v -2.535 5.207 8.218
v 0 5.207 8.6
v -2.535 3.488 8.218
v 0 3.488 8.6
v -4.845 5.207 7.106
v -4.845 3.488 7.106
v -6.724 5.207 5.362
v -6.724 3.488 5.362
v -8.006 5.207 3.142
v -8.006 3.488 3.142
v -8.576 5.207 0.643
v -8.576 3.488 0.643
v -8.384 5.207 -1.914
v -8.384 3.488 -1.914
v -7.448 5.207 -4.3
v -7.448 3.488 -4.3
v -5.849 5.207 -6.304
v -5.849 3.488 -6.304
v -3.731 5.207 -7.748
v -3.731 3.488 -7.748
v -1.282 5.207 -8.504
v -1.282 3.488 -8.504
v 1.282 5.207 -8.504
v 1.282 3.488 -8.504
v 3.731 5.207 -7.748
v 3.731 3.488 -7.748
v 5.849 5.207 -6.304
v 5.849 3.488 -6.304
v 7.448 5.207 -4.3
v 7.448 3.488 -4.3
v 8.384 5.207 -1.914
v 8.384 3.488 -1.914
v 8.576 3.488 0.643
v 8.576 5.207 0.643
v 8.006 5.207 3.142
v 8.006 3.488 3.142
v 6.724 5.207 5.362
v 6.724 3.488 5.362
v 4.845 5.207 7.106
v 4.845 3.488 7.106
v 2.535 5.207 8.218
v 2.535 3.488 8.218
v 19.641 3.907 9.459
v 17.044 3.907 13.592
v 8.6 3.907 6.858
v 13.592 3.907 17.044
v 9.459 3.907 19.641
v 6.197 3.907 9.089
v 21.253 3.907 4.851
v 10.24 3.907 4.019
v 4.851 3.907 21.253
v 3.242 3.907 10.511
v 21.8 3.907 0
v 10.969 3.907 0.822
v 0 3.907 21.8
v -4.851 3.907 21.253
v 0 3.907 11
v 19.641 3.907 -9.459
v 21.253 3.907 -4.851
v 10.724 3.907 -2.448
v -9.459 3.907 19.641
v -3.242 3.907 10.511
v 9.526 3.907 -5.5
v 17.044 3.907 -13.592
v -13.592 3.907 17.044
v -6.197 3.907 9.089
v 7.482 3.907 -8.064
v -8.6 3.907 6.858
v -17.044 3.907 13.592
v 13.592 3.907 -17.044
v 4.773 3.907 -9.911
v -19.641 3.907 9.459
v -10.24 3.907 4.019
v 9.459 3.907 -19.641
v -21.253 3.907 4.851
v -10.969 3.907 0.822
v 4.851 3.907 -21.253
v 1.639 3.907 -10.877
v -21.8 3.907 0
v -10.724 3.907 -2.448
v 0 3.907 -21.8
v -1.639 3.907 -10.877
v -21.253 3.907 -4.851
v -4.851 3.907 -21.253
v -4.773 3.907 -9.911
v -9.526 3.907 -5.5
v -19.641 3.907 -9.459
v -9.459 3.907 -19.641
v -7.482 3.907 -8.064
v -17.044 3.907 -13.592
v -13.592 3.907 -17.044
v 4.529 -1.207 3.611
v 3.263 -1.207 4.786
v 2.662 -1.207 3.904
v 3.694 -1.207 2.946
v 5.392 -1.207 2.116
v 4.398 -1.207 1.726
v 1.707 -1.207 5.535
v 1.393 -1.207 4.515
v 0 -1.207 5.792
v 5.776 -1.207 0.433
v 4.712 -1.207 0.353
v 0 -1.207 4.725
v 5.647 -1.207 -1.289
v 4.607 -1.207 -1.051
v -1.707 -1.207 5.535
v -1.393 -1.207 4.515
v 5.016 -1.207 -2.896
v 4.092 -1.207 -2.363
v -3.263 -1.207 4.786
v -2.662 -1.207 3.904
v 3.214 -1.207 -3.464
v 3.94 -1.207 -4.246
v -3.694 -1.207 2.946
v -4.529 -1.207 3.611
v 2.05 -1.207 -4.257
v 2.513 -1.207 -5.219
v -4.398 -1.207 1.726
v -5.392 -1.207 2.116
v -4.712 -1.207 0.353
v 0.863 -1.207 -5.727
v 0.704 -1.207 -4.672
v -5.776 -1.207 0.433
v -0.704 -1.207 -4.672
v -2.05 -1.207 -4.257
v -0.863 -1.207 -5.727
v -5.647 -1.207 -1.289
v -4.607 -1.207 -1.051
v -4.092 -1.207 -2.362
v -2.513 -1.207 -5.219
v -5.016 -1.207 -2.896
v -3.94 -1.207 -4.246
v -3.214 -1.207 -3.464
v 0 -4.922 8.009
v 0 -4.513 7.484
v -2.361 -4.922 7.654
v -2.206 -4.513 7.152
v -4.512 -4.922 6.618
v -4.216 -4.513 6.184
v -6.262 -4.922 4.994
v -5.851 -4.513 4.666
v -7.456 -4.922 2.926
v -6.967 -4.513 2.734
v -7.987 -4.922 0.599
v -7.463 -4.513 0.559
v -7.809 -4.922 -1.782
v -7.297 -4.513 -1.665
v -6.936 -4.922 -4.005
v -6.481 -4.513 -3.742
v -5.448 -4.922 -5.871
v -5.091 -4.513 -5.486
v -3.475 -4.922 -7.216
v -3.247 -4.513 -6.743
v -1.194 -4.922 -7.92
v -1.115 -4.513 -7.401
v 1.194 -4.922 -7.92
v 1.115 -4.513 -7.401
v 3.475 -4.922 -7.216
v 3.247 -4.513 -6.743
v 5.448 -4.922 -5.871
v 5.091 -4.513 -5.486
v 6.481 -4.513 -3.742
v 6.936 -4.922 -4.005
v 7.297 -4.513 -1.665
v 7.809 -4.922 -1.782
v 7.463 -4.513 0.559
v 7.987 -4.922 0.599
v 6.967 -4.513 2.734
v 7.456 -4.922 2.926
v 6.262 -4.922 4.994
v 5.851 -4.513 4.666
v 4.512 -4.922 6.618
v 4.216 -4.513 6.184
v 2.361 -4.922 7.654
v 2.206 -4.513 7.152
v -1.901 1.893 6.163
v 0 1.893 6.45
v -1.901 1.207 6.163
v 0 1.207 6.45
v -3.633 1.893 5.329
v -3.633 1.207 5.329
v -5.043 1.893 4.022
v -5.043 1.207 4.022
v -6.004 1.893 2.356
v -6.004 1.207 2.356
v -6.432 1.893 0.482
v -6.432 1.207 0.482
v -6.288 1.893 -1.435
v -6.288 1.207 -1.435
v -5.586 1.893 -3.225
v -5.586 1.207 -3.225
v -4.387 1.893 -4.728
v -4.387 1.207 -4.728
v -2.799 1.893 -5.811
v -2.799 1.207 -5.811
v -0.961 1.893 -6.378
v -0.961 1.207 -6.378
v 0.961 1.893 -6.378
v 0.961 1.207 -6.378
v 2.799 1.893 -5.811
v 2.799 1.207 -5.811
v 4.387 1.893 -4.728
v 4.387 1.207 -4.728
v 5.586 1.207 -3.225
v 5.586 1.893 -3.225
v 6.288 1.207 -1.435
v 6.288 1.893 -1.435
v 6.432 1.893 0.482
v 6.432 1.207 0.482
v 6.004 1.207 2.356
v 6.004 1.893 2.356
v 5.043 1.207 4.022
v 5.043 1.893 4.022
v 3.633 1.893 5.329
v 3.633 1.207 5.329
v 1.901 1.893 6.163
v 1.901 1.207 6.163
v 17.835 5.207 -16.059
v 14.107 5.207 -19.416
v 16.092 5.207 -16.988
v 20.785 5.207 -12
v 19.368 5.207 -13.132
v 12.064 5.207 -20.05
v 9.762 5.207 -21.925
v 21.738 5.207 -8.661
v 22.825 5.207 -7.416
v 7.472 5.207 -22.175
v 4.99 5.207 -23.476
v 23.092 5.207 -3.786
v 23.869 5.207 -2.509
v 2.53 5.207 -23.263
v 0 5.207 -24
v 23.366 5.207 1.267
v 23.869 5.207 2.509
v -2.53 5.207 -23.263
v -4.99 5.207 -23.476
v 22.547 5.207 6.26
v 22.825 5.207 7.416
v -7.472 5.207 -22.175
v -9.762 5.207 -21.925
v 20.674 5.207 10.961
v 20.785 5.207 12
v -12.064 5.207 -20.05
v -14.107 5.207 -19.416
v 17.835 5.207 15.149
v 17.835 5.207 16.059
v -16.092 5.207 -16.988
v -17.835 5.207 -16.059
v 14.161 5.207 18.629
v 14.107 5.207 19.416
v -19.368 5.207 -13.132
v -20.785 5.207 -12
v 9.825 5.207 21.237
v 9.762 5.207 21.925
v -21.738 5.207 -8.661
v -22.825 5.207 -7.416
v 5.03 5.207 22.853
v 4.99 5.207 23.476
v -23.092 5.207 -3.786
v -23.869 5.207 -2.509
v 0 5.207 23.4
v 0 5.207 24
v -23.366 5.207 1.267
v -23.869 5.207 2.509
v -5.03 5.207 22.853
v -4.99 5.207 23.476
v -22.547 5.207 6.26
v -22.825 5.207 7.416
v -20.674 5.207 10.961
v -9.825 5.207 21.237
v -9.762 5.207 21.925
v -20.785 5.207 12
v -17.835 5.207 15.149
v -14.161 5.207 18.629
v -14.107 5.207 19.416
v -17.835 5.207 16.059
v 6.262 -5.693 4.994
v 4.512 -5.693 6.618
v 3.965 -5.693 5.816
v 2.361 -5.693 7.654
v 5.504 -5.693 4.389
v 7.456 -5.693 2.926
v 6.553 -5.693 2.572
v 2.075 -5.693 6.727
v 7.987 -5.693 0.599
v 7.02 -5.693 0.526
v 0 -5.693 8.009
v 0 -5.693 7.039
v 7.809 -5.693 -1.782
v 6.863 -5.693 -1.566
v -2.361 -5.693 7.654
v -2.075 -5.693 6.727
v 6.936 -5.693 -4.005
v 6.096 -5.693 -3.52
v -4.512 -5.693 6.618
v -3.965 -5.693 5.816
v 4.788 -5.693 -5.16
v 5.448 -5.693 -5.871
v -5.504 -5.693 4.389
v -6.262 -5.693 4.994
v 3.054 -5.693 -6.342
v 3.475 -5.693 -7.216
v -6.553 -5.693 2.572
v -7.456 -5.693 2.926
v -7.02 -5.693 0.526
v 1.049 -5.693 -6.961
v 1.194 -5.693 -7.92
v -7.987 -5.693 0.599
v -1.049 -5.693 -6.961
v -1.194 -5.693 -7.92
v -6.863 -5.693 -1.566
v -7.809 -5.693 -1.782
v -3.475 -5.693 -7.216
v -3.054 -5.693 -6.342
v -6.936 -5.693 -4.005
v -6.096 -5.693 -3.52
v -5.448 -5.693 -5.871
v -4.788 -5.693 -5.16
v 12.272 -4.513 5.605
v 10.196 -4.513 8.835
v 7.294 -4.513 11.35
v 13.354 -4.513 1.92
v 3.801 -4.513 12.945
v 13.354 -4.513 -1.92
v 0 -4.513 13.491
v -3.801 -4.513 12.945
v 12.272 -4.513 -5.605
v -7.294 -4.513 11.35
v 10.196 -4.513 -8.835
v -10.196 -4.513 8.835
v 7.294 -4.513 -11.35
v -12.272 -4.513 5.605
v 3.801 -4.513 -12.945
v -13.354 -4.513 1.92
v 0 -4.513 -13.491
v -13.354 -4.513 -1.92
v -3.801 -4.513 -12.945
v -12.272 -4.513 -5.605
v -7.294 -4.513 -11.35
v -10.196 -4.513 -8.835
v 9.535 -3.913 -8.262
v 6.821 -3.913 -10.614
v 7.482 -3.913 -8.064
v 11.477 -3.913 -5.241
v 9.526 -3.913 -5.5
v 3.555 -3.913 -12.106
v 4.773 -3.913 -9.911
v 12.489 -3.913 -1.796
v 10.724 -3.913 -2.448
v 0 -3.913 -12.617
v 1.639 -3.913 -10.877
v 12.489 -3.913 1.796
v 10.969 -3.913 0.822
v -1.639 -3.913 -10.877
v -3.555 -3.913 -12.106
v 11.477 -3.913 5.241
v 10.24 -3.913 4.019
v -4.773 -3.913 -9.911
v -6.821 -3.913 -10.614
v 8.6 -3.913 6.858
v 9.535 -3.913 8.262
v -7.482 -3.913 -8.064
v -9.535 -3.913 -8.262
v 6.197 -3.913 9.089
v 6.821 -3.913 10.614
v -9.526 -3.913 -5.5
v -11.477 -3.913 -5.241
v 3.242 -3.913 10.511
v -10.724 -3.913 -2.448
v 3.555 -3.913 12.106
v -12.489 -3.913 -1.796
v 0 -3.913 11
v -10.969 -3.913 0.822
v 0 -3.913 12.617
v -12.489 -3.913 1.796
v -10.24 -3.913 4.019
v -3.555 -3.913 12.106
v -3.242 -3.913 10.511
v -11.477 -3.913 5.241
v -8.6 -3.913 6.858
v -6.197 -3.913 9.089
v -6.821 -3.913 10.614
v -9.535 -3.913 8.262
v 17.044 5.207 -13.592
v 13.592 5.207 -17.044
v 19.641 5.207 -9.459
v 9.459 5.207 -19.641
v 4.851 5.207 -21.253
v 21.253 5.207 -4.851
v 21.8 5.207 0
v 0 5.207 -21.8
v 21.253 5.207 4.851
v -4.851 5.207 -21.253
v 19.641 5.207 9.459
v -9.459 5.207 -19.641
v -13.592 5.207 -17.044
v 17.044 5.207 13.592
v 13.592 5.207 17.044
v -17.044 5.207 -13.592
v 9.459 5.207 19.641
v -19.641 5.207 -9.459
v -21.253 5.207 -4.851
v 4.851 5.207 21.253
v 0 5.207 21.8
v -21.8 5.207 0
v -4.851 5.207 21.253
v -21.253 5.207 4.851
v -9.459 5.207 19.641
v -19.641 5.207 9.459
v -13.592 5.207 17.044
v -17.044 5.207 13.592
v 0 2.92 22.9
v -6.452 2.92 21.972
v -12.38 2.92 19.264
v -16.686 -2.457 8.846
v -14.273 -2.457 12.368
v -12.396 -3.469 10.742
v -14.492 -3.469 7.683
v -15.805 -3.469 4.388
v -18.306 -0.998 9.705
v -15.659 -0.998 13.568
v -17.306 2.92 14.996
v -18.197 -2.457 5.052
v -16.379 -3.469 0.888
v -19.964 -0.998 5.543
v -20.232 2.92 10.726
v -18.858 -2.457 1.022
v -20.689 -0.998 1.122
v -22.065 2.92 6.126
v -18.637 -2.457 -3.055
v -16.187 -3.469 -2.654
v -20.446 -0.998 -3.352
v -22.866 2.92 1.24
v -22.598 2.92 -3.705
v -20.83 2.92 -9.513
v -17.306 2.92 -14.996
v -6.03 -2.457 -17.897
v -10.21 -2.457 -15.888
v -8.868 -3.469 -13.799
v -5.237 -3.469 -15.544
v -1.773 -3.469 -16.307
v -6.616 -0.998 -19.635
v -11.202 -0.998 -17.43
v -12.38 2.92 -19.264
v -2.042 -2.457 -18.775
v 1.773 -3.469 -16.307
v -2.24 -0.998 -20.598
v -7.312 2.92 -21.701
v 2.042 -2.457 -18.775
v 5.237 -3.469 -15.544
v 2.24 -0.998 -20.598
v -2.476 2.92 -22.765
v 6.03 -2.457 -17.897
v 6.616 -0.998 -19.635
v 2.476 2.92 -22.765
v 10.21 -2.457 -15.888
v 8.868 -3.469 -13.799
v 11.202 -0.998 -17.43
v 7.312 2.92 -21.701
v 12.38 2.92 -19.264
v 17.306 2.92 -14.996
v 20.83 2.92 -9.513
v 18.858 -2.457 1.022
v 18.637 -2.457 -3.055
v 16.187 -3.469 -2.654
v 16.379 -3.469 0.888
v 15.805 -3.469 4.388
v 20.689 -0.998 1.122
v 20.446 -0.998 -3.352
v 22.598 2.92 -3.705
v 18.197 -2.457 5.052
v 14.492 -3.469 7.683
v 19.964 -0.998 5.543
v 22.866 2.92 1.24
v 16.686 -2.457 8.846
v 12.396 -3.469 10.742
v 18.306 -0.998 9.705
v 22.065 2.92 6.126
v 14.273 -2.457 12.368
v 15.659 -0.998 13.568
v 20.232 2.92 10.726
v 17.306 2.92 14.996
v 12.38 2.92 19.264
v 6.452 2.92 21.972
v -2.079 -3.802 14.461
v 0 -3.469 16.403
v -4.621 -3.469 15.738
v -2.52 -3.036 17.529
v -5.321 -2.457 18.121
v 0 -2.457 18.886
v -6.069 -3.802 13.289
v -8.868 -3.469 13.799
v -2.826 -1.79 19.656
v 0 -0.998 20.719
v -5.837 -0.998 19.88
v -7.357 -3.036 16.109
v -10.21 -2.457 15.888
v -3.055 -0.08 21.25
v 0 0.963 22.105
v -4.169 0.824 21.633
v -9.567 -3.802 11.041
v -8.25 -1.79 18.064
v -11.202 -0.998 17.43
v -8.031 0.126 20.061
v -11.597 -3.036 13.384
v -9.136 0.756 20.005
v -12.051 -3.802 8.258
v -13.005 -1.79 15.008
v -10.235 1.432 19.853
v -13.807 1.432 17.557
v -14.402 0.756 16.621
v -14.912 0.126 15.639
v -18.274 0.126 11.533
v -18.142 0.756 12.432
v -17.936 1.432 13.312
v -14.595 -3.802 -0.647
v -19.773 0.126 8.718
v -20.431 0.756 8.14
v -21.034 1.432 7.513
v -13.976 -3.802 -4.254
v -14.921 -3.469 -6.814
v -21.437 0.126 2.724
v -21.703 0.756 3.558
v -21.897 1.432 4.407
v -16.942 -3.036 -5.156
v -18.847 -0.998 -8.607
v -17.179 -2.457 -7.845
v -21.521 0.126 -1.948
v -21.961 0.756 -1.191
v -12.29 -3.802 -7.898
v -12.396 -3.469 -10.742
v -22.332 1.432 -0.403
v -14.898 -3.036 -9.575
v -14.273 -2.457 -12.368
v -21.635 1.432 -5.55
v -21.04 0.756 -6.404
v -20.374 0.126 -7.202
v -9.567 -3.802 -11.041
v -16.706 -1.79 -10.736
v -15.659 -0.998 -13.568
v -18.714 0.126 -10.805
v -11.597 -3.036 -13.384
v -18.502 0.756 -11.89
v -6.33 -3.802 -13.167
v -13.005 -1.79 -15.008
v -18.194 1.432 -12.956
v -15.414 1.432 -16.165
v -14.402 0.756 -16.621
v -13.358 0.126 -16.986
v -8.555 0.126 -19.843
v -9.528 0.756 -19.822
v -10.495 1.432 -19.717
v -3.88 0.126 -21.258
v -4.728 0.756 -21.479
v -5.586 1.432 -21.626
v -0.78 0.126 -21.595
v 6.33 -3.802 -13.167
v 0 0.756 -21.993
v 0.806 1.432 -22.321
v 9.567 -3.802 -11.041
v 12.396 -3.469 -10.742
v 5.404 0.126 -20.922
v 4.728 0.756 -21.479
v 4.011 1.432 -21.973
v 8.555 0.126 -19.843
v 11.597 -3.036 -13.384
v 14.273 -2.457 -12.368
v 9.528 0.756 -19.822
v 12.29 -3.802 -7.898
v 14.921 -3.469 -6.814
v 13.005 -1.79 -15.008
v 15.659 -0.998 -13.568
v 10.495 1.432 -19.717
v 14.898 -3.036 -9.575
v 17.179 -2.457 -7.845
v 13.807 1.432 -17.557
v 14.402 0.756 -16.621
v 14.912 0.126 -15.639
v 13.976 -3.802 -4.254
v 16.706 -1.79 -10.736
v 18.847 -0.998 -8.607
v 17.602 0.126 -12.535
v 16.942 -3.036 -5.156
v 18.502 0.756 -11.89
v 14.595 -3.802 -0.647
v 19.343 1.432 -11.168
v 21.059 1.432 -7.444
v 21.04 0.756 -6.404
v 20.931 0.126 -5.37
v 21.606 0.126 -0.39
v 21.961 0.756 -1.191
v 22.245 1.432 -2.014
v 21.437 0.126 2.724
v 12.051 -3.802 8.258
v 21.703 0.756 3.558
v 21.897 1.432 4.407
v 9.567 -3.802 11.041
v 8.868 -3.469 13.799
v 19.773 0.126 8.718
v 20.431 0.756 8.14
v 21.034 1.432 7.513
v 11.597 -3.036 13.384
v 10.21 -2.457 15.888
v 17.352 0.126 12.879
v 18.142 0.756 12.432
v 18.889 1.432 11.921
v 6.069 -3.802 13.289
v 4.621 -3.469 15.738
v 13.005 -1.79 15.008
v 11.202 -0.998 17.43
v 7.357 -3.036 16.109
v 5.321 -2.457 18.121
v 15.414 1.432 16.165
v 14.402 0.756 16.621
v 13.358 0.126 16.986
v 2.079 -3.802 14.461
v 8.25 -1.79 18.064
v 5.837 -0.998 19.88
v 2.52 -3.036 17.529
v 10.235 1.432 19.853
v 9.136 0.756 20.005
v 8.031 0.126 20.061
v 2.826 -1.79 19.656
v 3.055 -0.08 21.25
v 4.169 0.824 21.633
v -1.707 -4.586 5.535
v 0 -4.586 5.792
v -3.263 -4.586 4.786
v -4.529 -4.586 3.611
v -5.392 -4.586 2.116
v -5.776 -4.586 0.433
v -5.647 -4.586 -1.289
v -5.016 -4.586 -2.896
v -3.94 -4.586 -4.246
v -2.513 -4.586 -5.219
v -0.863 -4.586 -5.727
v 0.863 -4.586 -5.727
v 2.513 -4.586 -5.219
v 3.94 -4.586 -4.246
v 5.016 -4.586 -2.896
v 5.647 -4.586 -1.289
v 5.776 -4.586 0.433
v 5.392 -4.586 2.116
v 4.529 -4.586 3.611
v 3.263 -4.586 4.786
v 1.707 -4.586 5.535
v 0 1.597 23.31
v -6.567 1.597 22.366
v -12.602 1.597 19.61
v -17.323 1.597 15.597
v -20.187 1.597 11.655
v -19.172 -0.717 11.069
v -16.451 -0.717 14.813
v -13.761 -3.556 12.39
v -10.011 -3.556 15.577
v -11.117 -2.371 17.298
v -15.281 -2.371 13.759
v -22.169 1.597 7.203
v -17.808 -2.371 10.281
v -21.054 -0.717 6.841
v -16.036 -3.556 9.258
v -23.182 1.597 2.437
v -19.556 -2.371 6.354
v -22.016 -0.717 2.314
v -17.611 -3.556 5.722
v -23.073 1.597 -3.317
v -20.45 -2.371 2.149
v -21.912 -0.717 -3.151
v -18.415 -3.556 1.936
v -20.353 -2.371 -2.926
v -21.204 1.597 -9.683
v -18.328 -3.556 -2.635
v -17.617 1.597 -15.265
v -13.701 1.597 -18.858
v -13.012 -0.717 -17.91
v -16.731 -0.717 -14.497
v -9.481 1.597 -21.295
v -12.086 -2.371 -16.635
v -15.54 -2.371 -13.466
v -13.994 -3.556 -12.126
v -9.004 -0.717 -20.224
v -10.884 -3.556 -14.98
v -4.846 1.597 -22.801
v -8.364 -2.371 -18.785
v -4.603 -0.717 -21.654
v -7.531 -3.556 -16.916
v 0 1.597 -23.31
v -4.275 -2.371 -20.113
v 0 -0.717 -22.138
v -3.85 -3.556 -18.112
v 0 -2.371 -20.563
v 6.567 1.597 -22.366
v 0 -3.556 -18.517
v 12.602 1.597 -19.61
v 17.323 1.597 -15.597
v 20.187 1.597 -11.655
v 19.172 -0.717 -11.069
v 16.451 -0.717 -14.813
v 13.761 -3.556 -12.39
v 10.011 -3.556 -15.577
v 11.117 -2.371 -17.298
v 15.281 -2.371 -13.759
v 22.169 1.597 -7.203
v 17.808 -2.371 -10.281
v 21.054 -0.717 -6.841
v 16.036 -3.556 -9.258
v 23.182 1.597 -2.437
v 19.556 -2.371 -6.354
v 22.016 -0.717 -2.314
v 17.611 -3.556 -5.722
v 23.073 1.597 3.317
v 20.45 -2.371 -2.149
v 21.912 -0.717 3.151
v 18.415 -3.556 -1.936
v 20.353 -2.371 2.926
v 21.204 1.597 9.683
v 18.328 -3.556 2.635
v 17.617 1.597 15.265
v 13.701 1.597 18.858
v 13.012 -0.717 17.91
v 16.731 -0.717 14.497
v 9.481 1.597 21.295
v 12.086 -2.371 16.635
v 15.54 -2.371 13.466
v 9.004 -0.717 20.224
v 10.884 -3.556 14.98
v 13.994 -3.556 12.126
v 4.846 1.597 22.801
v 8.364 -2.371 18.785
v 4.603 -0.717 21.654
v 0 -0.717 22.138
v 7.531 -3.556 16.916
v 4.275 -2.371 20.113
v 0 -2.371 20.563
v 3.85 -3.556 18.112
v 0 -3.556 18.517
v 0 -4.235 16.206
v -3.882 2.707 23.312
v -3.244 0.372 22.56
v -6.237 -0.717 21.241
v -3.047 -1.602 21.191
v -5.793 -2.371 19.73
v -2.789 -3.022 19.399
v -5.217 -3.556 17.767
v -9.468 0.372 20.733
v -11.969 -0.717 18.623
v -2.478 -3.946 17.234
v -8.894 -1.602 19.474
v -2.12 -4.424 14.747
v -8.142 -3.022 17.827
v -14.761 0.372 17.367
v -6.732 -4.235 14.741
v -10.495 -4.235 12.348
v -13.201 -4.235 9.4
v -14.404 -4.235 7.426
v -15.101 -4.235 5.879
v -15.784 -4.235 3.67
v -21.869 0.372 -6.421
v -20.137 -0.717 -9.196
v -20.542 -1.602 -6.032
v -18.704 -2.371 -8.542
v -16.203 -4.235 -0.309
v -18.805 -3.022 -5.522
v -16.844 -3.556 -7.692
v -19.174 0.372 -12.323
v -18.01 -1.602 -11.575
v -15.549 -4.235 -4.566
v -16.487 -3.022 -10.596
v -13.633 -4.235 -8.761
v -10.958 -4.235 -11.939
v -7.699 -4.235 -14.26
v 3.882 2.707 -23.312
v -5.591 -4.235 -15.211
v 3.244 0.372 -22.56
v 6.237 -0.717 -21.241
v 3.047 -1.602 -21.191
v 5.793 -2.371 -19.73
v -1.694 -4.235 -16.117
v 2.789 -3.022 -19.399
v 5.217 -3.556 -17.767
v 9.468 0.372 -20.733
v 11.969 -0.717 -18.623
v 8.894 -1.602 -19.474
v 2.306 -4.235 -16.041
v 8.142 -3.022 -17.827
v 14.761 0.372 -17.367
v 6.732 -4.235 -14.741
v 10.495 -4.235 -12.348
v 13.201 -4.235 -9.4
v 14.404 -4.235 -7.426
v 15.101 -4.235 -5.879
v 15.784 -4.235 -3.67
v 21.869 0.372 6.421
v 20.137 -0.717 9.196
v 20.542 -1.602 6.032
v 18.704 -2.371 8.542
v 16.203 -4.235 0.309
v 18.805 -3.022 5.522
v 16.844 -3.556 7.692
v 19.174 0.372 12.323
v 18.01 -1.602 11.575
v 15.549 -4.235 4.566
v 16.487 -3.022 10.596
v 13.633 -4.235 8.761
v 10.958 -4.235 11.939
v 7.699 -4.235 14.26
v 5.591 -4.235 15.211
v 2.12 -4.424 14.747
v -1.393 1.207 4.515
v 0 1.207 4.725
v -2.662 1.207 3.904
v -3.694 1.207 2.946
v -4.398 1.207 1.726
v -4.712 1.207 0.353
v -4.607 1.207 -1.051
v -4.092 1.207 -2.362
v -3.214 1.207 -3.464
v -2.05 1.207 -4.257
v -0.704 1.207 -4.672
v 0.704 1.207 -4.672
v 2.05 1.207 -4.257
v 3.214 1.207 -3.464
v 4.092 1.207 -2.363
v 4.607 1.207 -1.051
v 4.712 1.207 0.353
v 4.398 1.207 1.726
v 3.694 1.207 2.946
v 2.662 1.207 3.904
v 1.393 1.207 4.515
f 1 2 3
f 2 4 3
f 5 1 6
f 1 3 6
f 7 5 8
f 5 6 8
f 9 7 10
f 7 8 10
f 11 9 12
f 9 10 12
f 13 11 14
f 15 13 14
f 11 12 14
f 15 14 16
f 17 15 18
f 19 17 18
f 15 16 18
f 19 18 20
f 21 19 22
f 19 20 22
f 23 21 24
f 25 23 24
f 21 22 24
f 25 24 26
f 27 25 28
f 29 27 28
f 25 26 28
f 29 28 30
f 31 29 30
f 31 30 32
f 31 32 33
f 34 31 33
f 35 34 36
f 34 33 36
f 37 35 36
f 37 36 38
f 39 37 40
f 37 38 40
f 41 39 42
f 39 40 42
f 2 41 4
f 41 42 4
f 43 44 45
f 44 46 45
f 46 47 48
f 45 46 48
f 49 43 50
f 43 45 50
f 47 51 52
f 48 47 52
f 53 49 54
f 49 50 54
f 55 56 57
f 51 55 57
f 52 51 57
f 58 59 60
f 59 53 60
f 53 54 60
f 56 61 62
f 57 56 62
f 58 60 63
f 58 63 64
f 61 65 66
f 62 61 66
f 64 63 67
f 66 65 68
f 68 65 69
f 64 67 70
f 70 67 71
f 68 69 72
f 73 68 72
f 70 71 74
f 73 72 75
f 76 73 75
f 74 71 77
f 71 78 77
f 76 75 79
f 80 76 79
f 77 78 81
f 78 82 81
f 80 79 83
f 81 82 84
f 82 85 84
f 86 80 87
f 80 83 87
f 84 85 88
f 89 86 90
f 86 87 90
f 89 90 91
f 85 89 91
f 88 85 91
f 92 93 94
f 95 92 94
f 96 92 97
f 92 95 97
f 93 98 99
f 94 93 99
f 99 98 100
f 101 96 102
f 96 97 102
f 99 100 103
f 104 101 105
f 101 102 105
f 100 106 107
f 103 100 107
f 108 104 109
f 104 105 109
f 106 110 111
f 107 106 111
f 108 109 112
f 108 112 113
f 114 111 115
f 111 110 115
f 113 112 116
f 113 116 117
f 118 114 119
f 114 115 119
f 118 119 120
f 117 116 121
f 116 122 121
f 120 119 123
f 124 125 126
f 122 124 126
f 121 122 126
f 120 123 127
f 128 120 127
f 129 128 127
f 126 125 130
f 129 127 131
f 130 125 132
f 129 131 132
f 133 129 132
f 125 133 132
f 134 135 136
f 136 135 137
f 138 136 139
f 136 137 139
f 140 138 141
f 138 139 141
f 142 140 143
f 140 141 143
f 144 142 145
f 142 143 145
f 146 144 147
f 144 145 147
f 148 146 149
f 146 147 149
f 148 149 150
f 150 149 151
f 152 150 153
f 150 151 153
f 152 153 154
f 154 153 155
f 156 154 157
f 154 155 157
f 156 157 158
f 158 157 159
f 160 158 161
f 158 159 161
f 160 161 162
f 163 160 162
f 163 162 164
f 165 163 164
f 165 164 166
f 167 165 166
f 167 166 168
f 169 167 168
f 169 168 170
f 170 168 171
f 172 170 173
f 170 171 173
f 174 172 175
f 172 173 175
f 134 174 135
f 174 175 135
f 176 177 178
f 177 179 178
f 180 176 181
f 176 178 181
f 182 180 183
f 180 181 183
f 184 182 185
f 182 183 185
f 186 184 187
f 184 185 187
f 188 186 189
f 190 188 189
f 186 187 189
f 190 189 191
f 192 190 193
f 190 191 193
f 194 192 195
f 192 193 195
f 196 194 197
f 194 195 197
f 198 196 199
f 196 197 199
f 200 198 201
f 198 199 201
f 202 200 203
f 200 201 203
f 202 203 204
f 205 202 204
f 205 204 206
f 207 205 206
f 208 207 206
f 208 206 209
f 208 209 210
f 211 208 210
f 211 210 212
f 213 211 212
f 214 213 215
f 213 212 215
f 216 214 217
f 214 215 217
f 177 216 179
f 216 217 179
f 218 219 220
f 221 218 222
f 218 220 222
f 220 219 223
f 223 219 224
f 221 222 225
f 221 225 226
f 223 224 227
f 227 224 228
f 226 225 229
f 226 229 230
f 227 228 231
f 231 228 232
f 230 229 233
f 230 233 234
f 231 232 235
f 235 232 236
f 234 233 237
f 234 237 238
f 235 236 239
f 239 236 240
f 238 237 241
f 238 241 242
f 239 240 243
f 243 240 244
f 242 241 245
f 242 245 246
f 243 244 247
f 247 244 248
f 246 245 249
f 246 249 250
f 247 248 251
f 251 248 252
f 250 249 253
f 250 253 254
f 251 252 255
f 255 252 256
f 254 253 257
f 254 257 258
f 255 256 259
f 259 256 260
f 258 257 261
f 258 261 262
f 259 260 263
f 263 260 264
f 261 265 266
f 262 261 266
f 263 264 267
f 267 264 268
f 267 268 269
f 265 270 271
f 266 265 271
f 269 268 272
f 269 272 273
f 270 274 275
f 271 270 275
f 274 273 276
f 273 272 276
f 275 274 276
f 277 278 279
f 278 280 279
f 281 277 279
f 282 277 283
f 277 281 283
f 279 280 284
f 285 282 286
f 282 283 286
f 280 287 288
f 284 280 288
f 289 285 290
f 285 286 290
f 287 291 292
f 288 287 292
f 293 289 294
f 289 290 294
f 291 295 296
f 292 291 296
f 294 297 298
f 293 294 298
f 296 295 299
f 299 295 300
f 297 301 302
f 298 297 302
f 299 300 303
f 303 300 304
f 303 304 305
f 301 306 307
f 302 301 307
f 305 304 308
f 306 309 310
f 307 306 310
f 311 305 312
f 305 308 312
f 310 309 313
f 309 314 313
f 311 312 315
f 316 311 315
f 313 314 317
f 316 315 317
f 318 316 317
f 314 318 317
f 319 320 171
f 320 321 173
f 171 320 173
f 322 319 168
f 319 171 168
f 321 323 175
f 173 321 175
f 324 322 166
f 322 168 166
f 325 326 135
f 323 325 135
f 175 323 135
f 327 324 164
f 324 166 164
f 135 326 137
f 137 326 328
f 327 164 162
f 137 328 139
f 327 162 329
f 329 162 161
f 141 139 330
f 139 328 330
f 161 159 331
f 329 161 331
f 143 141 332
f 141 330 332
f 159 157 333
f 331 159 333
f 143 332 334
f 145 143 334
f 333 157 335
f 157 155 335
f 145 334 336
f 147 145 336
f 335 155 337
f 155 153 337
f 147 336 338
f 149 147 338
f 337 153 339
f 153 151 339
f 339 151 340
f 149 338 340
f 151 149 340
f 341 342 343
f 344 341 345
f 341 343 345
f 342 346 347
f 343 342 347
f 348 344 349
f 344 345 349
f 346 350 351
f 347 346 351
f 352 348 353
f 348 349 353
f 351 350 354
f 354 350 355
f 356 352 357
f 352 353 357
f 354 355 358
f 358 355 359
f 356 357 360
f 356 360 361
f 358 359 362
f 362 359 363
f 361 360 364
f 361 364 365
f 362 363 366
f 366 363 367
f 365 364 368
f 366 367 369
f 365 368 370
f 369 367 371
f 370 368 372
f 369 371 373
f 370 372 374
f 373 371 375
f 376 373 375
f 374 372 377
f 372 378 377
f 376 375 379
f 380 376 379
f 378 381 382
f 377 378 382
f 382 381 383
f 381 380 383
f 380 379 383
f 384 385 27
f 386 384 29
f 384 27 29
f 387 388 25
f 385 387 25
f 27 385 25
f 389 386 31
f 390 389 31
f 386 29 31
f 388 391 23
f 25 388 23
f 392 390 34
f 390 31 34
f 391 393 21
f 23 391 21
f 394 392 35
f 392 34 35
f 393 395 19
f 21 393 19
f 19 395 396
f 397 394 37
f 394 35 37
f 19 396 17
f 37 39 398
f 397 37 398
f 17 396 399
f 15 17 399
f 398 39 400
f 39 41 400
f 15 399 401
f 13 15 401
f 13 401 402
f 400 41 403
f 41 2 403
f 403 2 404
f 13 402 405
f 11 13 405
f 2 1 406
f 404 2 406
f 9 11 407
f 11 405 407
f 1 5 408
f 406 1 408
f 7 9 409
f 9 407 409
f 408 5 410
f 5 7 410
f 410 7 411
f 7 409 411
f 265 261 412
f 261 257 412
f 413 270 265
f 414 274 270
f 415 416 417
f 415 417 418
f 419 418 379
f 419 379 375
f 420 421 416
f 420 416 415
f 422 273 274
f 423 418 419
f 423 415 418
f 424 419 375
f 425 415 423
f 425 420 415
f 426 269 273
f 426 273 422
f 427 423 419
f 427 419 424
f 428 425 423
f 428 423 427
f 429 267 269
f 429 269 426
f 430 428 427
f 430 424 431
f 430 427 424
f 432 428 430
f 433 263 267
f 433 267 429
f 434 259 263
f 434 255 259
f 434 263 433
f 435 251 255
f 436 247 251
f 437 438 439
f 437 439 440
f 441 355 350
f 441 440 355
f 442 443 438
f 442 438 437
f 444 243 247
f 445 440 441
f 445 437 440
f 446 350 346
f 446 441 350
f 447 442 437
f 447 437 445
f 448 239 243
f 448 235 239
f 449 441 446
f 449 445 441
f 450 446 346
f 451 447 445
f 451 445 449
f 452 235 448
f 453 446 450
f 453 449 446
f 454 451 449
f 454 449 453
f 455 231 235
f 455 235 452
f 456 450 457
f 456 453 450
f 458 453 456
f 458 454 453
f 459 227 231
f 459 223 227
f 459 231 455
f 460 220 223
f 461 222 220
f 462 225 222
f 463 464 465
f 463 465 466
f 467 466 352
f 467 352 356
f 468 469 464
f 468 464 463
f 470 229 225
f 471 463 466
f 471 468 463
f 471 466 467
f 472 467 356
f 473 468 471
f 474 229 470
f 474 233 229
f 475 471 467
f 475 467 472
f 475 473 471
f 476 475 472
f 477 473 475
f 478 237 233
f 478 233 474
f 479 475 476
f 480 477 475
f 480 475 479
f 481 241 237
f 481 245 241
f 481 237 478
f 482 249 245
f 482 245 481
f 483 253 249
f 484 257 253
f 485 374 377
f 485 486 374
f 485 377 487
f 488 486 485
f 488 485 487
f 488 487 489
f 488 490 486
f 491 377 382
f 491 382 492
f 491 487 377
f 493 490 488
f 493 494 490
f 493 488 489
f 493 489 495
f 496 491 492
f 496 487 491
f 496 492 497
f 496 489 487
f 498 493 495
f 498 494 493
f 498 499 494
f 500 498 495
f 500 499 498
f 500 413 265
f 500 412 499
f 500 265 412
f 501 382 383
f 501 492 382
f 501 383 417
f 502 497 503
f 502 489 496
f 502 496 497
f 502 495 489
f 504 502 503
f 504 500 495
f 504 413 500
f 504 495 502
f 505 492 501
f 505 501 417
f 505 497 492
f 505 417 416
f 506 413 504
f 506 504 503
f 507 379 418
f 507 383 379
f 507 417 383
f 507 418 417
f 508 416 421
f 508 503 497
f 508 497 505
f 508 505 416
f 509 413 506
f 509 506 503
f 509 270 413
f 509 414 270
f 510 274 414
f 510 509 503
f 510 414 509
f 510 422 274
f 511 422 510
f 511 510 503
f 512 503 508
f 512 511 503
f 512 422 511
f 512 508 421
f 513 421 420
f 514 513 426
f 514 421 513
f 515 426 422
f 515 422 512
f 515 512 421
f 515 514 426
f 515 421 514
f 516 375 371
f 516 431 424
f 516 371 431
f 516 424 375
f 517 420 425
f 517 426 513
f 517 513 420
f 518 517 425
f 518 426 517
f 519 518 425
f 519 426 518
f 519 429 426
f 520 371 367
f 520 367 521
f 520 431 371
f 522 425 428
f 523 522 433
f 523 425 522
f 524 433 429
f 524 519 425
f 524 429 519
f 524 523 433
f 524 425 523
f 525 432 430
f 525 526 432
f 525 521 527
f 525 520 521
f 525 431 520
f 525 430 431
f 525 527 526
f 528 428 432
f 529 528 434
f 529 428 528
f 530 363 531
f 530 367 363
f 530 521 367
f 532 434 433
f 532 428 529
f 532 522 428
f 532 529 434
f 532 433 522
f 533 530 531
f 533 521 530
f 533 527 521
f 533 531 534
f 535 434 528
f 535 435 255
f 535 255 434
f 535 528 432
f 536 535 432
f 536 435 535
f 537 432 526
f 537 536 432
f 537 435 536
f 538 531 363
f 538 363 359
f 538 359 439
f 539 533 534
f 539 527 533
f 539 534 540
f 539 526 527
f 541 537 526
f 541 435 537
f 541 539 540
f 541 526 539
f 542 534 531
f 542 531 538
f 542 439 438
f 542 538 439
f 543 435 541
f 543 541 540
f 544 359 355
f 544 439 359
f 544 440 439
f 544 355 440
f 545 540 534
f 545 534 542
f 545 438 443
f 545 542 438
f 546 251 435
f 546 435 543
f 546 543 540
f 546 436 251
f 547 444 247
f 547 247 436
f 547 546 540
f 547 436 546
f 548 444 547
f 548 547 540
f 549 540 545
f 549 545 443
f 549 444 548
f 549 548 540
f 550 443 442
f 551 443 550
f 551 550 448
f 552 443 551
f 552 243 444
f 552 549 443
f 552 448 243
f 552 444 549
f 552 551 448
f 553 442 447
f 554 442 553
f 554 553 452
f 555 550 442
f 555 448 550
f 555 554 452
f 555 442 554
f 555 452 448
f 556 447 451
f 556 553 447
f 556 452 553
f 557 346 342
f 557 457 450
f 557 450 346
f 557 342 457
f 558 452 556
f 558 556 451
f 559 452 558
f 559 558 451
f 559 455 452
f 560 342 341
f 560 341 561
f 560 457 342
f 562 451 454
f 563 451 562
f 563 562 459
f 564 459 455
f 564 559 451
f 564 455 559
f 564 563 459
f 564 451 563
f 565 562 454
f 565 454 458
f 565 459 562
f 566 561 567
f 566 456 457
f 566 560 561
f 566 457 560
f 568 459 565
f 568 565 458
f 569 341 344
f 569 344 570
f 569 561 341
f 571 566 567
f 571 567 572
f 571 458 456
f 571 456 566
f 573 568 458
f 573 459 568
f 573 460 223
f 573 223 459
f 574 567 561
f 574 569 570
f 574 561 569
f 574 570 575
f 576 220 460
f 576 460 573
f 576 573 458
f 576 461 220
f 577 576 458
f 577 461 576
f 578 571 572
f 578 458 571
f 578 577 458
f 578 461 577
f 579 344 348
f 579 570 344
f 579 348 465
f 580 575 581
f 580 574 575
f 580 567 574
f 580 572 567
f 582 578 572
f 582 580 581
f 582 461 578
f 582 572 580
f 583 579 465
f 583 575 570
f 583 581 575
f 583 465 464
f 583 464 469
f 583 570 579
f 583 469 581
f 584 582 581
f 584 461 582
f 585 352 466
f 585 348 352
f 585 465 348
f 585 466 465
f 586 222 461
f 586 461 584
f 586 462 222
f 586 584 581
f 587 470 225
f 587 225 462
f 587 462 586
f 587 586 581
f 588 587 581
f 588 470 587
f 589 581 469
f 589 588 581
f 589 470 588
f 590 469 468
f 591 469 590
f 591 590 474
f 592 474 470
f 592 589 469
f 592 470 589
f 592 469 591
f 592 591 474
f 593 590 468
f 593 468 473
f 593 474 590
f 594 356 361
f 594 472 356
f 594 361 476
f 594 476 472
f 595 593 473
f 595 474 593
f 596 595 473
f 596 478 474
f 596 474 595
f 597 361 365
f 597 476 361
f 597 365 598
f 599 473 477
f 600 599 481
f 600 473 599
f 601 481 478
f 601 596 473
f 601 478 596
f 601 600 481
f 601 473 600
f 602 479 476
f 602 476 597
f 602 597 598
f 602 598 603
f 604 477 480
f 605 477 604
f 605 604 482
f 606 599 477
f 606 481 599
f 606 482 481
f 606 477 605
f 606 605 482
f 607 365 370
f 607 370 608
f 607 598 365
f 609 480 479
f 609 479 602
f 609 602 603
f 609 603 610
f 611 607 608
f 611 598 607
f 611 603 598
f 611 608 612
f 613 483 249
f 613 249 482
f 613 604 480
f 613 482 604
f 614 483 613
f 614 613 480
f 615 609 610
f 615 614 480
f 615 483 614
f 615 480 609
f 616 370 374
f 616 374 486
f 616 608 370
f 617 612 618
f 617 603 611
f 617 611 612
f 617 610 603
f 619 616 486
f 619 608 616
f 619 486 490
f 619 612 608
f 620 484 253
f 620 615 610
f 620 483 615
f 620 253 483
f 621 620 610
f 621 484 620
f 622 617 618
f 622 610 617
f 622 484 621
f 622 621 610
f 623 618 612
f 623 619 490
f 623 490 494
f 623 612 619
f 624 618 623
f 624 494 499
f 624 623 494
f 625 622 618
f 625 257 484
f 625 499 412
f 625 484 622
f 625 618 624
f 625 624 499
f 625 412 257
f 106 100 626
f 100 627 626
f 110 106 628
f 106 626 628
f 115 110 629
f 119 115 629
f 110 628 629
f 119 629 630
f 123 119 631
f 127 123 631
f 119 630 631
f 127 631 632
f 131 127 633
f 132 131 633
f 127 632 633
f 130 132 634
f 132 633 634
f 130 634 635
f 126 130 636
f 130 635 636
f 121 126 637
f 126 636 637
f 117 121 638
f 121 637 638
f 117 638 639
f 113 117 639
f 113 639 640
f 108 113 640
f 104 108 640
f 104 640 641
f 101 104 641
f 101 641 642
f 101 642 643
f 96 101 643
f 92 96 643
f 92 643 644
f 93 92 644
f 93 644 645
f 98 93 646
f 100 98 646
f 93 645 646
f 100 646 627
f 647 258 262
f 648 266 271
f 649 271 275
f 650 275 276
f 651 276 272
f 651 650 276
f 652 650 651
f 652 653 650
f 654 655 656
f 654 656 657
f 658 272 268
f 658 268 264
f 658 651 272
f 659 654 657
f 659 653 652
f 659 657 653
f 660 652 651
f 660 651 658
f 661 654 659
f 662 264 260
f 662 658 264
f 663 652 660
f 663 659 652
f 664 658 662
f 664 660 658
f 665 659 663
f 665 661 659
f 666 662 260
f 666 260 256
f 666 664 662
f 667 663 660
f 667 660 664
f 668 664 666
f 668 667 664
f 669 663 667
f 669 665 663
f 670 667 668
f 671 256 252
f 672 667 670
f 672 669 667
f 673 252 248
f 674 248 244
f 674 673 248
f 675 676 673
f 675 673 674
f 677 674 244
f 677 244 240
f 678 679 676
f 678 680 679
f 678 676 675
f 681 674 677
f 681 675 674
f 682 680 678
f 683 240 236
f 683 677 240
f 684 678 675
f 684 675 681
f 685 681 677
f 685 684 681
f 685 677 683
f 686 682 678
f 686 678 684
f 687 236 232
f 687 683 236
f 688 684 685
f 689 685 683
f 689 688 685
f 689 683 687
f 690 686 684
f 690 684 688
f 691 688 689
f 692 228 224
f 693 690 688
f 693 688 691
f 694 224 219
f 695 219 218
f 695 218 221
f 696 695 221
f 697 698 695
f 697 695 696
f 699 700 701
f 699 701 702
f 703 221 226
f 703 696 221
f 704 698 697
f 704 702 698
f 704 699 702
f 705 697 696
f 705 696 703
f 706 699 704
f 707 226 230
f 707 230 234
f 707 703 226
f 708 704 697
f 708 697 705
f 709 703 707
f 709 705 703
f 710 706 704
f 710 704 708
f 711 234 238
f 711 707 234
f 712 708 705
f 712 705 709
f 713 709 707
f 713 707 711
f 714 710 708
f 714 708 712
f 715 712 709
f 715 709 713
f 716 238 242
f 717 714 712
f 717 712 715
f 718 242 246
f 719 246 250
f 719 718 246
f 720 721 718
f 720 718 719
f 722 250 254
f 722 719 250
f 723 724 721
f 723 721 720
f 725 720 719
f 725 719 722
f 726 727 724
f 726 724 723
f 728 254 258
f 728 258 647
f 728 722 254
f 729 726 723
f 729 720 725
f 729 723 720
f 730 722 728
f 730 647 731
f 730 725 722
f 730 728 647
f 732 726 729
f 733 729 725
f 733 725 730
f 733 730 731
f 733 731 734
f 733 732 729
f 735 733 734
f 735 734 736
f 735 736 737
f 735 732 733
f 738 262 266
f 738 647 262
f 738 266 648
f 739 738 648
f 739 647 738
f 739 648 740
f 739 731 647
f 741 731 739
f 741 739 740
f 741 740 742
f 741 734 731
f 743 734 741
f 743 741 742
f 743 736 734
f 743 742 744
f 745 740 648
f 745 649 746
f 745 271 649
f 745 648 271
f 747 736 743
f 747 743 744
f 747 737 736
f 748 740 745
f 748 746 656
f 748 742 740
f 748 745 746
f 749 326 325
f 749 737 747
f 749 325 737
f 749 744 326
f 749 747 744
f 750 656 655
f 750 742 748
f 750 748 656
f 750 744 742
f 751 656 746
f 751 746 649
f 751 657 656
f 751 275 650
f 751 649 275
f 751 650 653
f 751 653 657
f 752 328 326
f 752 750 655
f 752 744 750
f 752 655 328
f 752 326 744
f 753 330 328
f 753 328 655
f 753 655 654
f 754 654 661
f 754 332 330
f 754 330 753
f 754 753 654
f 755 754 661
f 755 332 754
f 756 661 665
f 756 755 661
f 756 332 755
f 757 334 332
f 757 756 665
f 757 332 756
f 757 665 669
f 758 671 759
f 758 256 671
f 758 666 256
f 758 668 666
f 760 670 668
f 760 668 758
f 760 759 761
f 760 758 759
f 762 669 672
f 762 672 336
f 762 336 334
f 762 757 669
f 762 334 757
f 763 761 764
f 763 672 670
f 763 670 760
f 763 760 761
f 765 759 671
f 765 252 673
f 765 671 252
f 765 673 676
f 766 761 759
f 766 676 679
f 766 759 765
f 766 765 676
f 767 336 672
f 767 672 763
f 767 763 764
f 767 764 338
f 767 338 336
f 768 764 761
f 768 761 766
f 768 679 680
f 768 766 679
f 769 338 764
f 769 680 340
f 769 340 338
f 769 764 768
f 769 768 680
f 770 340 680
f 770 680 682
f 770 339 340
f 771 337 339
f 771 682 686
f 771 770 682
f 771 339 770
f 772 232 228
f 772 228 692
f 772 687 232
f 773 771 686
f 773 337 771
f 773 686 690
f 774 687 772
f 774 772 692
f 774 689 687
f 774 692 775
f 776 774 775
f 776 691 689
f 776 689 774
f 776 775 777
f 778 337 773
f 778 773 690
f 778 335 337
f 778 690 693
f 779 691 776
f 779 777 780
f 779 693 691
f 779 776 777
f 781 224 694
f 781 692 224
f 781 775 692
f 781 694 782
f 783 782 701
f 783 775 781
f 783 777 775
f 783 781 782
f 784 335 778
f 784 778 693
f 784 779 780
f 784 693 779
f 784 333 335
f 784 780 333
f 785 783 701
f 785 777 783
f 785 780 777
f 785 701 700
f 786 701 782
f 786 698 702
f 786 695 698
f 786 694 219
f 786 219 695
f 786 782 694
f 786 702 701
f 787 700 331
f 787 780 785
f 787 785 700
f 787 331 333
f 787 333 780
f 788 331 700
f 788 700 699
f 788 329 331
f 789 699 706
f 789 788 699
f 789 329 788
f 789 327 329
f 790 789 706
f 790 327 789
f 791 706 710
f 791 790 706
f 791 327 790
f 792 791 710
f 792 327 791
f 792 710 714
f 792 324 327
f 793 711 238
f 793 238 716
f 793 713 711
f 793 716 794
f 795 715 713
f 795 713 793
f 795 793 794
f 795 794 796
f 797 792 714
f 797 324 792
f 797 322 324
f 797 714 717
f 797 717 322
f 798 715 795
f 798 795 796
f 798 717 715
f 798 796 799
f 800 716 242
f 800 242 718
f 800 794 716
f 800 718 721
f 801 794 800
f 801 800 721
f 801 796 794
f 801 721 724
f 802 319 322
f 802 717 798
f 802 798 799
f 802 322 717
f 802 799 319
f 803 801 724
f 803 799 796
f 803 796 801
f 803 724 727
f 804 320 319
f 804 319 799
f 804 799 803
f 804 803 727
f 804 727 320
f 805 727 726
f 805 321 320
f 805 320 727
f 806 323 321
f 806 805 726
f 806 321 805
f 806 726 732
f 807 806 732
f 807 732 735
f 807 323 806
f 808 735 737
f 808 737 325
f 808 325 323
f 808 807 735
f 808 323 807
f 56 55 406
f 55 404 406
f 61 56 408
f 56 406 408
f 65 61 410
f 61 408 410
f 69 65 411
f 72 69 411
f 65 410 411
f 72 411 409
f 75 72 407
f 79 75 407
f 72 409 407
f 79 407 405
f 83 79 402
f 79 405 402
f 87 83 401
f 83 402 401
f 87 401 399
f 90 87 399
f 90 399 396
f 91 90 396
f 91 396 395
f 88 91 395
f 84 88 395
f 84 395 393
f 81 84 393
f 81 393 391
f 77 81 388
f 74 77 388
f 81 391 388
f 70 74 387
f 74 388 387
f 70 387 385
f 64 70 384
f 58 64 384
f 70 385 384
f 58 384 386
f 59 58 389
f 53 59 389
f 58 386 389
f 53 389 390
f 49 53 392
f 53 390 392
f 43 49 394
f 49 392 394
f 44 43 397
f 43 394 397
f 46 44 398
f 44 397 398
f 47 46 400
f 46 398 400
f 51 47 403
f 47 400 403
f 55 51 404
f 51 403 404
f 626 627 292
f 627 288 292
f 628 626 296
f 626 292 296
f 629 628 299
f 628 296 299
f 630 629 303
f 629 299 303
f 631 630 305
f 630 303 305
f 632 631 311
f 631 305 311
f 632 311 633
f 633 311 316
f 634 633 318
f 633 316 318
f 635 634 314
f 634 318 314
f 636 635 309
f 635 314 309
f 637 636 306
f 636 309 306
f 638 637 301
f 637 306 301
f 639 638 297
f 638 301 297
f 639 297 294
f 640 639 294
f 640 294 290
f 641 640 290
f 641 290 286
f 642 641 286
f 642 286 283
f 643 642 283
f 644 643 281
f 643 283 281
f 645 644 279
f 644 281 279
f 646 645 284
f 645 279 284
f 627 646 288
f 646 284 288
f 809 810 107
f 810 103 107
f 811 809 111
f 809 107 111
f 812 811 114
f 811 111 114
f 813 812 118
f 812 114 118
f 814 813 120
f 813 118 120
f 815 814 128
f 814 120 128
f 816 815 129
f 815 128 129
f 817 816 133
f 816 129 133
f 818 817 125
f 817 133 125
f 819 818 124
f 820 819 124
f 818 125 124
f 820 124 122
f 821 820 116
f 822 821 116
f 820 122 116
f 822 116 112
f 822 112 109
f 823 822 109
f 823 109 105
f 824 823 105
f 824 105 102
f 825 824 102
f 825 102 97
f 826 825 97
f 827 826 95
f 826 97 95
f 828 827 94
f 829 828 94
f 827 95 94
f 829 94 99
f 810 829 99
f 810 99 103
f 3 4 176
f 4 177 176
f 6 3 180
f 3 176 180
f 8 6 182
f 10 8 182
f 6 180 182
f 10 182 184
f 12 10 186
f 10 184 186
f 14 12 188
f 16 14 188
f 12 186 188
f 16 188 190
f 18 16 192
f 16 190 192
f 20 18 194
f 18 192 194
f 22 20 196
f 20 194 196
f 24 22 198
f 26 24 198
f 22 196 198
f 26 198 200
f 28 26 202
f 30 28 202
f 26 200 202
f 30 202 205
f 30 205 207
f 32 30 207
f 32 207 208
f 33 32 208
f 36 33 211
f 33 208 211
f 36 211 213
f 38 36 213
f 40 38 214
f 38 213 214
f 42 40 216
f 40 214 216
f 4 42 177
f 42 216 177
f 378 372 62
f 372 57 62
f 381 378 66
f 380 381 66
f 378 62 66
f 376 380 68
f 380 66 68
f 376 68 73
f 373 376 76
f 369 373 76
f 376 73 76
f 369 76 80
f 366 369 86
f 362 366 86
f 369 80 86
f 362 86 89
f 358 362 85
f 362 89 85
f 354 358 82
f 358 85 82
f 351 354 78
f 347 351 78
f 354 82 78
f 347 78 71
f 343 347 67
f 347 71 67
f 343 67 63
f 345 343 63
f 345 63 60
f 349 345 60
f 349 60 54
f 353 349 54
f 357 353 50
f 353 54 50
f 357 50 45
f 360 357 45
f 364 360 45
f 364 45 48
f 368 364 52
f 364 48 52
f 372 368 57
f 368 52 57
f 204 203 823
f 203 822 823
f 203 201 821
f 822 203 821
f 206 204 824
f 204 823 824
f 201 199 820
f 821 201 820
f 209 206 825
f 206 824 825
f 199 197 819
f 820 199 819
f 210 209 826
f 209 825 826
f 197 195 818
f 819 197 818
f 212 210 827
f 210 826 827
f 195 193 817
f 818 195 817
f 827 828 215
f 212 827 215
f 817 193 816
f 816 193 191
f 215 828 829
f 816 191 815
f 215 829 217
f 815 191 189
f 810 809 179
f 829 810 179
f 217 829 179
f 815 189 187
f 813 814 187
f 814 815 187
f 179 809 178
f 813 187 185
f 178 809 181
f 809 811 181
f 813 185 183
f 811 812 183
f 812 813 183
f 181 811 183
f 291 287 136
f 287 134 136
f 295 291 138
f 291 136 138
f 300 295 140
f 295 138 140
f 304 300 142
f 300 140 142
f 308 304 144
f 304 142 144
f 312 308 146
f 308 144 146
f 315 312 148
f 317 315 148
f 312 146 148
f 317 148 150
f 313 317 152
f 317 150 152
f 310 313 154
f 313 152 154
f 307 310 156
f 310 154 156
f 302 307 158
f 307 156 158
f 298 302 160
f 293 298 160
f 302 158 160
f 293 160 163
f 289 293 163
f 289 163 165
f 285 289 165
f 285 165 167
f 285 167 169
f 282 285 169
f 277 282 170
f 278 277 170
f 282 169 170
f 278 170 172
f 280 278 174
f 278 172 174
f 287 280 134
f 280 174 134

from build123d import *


with BuildPart() as part:
    # Sketch1 → Revolve1 (revolve)
    with BuildSketch(Plane.XY):
        with BuildLine():
            Line((-21.8, 5.207082814), (-8.6, 5.207082814))
            Line((-8.6, 5.207082814), (-8.6, 3.487716788))
            Line((-8.6, 3.487716788), (-6.45, 1.893195372))
            Line((-6.45, 1.893195372), (-6.45, 1.207082814))
            Line((-6.45, 1.207082814), (-4.725, 1.207082814))
            Line((-4.725, 1.207082814), (-4.725, -1.207082814))
            Line((-4.725, -1.207082814), (-5.792193517, -1.207082814))
            Line((-5.792193517, -1.207082814), (-5.792193517, -4.58565461))
            Line((-5.792193517, -4.58565461), (-7.039346549, -5.692917186))
            Line((-7.039346549, -5.692917186), (-8.009354463, -5.692917186))
            Line((-8.009354463, -5.692917186), (-8.009354463, -4.922332057))
            Line((-8.009354463, -4.922332057), (-7.484167863, -4.512624738))
            Line((-7.484167863, -4.512624738), (-13.491490452, -4.512624738))
            add(Edge.make_bspline(
                [(-24, 5.207082814), (-23.362064214, -4.252005312), (-13.491490452, -4.512624738)],
                knots=[0, 0, 0, 1, 1, 1], degree=2))
            Line((-24, 5.207082814), (-23.4, 5.207082814))
            add(Edge.make_bspline(
                [(-12.616940425, -3.912624738), (-22.084892945, -3.918102421), (-23.4, 5.207082814)],
                knots=[0, 0, 0, 1, 1, 1], degree=2))
            Line((-12.616940425, -3.912624738), (-11, -3.912624738))
            Line((-11, -3.912624738), (-11, 3.907082814))
            Line((-11, 3.907082814), (-21.8, 3.907082814))
            Line((-21.8, 3.907082814), (-21.8, 5.207082814))
        make_face()
    revolve(axis=Axis((0, 24.52235385, 0), (0, -1, 0)))


solid = part.part
